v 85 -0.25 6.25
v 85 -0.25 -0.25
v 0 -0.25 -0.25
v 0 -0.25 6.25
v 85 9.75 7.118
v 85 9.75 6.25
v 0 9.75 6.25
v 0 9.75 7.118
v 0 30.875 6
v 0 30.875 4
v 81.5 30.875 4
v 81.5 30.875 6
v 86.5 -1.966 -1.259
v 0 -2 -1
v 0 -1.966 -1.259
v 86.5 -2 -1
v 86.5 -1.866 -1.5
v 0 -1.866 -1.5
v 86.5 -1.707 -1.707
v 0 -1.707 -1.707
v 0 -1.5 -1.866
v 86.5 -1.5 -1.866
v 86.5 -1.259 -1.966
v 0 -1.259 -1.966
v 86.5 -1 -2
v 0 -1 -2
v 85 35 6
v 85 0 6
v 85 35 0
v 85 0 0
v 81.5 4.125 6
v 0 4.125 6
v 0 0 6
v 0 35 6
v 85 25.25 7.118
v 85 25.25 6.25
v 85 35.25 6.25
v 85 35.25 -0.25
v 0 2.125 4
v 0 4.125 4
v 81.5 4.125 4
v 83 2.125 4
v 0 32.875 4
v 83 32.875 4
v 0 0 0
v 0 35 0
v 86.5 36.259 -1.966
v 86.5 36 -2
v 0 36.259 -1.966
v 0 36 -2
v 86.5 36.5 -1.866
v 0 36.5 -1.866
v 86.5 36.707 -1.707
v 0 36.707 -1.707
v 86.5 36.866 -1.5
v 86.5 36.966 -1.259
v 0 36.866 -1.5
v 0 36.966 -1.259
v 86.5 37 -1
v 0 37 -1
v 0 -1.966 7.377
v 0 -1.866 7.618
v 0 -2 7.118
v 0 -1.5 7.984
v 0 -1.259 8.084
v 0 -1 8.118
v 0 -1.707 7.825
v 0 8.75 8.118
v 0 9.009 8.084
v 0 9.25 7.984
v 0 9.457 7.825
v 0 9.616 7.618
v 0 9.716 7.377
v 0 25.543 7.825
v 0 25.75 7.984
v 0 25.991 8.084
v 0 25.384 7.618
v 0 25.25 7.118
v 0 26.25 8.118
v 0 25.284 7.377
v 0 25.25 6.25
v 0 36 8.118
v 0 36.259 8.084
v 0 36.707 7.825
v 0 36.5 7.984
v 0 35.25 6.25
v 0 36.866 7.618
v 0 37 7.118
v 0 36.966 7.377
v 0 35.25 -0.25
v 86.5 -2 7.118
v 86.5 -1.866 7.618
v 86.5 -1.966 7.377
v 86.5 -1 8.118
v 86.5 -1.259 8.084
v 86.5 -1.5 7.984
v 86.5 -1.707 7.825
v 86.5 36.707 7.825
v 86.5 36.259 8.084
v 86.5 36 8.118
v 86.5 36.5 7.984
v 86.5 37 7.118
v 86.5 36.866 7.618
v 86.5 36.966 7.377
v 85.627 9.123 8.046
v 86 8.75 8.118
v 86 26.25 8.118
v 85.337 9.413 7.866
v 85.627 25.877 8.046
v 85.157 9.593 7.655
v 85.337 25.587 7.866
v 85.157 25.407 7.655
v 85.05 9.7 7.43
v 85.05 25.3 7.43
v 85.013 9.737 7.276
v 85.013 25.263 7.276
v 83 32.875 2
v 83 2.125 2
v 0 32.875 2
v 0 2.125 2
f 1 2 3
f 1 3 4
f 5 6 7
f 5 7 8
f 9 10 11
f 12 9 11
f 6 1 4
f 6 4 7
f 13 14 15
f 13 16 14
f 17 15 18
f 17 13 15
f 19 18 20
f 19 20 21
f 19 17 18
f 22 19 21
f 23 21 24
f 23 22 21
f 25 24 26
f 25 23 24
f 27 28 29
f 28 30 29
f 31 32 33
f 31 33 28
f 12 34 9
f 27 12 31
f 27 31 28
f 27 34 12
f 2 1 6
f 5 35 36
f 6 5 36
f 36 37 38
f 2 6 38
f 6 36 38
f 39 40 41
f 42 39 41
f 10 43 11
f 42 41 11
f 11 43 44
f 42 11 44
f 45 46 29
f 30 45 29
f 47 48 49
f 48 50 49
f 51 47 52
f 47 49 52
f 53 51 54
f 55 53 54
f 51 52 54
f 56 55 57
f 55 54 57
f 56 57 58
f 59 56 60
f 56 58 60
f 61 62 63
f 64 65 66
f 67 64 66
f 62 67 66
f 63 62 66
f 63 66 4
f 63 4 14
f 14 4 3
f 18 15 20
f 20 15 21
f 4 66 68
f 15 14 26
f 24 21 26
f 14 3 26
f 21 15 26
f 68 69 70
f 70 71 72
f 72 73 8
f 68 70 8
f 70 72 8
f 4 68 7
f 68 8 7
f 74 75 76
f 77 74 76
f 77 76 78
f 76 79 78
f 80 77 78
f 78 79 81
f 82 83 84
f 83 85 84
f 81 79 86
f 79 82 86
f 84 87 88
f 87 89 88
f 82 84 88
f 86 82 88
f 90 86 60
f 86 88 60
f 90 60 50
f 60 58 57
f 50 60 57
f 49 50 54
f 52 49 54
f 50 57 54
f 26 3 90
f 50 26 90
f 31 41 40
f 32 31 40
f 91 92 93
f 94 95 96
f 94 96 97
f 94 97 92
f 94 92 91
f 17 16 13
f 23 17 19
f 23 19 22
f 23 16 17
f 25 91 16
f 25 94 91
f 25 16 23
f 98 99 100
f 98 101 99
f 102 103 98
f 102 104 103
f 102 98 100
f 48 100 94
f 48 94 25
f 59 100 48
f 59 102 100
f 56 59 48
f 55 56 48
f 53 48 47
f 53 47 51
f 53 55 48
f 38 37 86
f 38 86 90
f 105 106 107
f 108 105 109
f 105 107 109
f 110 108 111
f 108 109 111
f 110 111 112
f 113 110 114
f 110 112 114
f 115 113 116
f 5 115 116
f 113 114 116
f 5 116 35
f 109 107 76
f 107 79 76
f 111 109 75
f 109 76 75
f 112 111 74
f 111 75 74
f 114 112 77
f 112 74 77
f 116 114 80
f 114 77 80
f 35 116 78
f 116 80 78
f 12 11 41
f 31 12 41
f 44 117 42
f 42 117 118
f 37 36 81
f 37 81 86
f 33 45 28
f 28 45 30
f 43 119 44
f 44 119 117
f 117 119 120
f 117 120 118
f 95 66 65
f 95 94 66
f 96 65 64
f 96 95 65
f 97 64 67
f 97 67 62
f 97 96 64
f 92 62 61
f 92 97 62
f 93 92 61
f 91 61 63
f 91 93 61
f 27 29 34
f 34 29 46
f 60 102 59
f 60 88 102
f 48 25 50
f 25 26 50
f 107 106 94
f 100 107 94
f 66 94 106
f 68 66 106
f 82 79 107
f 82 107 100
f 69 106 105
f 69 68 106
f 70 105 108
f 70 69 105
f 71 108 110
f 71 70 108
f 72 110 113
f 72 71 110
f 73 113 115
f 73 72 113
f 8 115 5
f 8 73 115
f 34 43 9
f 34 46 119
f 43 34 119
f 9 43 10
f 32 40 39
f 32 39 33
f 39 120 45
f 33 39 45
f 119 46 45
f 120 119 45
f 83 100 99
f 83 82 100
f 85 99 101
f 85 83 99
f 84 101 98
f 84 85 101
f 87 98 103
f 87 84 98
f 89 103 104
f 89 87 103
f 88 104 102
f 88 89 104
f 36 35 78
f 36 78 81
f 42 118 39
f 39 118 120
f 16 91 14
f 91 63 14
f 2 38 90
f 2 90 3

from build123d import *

# Parameters (mm, degrees)
SKETCH1_W           = 85
SKETCH1_H           = 35
BOSS_EXTRUDE1_DEPTH = 2
BOSS_EXTRUDE2_DEPTH = 2
BOSS_EXTRUDE3_DEPTH = 2
BOSS_EXTRUDE4_DEPTH = 85
SKETCH6_W           = 10.11797479
SKETCH6_H           = 39
BOSS_EXTRUDE5_DEPTH = 1.5
FILLET1_R           = 1


with BuildPart() as part:
    # Sketch1 → Boss-Extrude1 (new body)
    with BuildSketch(Plane.XY):
        with Locations((42.5, 17.5)):
            Rectangle(SKETCH1_W, SKETCH1_H)
    extrude(amount=BOSS_EXTRUDE1_DEPTH)

    # Sketch2 → Boss-Extrude2 (add)
    with BuildSketch(Plane.XY.offset(2)):
        Polygon((83, 2.125), (0, 2.125), (0, 0), (85, 0), (85, 35), (0, 35), (0, 32.875), (83, 32.875), align=None)
    extrude(amount=BOSS_EXTRUDE2_DEPTH)

    # Sketch3 → Boss-Extrude3 (add)
    with BuildSketch(Plane.XY.offset(4)):
        Polygon((0, 4.125), (0, 2.125), (83, 2.125), (83, 32.875), (0, 32.875), (0, 30.875), (81.5, 30.875), (81.5, 4.125), align=None)
        Polygon((0, 32.875), (83, 32.875), (83, 2.125), (0, 2.125), (0, 0), (85, 0), (85, 35), (0, 35), align=None)
    extrude(amount=BOSS_EXTRUDE3_DEPTH)


with BuildPart() as body_2:
    # Sketch5 → Boss-Extrude4 (new body)
    with BuildSketch(Plane(origin=(85, 0, 0), x_dir=(0, 0, -1), z_dir=(1, 0, 0))):
        Polygon((2, -2), (2, 37), (-8.11797479, 37), (-8.11797479, 25.25), (-6.25, 25.25), (-6.25, 35.25), (0.25, 35.25), (0.25, -0.25), (-6.25, -0.25), (-6.25, 9.75), (-8.11797479, 9.75), (-8.11797479, -2), align=None)
    extrude(amount=-BOSS_EXTRUDE4_DEPTH)

    # Sketch6 → Boss-Extrude5 (add)
    with BuildSketch(Plane(origin=(85, 0, 0), x_dir=(0, 0, -1), z_dir=(1, 0, 0))):
        with Locations((-3.058987395, 17.5)):
            Rectangle(SKETCH6_W, SKETCH6_H)
    extrude(amount=BOSS_EXTRUDE5_DEPTH)

    # Fillet1
    fillet1_edges = [body_2.edges().sort_by_distance(p)[0] for p in [
        (42.5, 9.75, 8.11797479),
        (43.25, -2, 8.11797479),
        (43.25, -2, -2),
        (43.25, 37, -2),
        (43.25, 37, 8.11797479),
        (42.5, 25.25, 8.11797479),
        (85, 17.5, 8.11797479),
    ]]
    fillet(fillet1_edges, radius=FILLET1_R)


solid = Compound([part.part, body_2.part])
